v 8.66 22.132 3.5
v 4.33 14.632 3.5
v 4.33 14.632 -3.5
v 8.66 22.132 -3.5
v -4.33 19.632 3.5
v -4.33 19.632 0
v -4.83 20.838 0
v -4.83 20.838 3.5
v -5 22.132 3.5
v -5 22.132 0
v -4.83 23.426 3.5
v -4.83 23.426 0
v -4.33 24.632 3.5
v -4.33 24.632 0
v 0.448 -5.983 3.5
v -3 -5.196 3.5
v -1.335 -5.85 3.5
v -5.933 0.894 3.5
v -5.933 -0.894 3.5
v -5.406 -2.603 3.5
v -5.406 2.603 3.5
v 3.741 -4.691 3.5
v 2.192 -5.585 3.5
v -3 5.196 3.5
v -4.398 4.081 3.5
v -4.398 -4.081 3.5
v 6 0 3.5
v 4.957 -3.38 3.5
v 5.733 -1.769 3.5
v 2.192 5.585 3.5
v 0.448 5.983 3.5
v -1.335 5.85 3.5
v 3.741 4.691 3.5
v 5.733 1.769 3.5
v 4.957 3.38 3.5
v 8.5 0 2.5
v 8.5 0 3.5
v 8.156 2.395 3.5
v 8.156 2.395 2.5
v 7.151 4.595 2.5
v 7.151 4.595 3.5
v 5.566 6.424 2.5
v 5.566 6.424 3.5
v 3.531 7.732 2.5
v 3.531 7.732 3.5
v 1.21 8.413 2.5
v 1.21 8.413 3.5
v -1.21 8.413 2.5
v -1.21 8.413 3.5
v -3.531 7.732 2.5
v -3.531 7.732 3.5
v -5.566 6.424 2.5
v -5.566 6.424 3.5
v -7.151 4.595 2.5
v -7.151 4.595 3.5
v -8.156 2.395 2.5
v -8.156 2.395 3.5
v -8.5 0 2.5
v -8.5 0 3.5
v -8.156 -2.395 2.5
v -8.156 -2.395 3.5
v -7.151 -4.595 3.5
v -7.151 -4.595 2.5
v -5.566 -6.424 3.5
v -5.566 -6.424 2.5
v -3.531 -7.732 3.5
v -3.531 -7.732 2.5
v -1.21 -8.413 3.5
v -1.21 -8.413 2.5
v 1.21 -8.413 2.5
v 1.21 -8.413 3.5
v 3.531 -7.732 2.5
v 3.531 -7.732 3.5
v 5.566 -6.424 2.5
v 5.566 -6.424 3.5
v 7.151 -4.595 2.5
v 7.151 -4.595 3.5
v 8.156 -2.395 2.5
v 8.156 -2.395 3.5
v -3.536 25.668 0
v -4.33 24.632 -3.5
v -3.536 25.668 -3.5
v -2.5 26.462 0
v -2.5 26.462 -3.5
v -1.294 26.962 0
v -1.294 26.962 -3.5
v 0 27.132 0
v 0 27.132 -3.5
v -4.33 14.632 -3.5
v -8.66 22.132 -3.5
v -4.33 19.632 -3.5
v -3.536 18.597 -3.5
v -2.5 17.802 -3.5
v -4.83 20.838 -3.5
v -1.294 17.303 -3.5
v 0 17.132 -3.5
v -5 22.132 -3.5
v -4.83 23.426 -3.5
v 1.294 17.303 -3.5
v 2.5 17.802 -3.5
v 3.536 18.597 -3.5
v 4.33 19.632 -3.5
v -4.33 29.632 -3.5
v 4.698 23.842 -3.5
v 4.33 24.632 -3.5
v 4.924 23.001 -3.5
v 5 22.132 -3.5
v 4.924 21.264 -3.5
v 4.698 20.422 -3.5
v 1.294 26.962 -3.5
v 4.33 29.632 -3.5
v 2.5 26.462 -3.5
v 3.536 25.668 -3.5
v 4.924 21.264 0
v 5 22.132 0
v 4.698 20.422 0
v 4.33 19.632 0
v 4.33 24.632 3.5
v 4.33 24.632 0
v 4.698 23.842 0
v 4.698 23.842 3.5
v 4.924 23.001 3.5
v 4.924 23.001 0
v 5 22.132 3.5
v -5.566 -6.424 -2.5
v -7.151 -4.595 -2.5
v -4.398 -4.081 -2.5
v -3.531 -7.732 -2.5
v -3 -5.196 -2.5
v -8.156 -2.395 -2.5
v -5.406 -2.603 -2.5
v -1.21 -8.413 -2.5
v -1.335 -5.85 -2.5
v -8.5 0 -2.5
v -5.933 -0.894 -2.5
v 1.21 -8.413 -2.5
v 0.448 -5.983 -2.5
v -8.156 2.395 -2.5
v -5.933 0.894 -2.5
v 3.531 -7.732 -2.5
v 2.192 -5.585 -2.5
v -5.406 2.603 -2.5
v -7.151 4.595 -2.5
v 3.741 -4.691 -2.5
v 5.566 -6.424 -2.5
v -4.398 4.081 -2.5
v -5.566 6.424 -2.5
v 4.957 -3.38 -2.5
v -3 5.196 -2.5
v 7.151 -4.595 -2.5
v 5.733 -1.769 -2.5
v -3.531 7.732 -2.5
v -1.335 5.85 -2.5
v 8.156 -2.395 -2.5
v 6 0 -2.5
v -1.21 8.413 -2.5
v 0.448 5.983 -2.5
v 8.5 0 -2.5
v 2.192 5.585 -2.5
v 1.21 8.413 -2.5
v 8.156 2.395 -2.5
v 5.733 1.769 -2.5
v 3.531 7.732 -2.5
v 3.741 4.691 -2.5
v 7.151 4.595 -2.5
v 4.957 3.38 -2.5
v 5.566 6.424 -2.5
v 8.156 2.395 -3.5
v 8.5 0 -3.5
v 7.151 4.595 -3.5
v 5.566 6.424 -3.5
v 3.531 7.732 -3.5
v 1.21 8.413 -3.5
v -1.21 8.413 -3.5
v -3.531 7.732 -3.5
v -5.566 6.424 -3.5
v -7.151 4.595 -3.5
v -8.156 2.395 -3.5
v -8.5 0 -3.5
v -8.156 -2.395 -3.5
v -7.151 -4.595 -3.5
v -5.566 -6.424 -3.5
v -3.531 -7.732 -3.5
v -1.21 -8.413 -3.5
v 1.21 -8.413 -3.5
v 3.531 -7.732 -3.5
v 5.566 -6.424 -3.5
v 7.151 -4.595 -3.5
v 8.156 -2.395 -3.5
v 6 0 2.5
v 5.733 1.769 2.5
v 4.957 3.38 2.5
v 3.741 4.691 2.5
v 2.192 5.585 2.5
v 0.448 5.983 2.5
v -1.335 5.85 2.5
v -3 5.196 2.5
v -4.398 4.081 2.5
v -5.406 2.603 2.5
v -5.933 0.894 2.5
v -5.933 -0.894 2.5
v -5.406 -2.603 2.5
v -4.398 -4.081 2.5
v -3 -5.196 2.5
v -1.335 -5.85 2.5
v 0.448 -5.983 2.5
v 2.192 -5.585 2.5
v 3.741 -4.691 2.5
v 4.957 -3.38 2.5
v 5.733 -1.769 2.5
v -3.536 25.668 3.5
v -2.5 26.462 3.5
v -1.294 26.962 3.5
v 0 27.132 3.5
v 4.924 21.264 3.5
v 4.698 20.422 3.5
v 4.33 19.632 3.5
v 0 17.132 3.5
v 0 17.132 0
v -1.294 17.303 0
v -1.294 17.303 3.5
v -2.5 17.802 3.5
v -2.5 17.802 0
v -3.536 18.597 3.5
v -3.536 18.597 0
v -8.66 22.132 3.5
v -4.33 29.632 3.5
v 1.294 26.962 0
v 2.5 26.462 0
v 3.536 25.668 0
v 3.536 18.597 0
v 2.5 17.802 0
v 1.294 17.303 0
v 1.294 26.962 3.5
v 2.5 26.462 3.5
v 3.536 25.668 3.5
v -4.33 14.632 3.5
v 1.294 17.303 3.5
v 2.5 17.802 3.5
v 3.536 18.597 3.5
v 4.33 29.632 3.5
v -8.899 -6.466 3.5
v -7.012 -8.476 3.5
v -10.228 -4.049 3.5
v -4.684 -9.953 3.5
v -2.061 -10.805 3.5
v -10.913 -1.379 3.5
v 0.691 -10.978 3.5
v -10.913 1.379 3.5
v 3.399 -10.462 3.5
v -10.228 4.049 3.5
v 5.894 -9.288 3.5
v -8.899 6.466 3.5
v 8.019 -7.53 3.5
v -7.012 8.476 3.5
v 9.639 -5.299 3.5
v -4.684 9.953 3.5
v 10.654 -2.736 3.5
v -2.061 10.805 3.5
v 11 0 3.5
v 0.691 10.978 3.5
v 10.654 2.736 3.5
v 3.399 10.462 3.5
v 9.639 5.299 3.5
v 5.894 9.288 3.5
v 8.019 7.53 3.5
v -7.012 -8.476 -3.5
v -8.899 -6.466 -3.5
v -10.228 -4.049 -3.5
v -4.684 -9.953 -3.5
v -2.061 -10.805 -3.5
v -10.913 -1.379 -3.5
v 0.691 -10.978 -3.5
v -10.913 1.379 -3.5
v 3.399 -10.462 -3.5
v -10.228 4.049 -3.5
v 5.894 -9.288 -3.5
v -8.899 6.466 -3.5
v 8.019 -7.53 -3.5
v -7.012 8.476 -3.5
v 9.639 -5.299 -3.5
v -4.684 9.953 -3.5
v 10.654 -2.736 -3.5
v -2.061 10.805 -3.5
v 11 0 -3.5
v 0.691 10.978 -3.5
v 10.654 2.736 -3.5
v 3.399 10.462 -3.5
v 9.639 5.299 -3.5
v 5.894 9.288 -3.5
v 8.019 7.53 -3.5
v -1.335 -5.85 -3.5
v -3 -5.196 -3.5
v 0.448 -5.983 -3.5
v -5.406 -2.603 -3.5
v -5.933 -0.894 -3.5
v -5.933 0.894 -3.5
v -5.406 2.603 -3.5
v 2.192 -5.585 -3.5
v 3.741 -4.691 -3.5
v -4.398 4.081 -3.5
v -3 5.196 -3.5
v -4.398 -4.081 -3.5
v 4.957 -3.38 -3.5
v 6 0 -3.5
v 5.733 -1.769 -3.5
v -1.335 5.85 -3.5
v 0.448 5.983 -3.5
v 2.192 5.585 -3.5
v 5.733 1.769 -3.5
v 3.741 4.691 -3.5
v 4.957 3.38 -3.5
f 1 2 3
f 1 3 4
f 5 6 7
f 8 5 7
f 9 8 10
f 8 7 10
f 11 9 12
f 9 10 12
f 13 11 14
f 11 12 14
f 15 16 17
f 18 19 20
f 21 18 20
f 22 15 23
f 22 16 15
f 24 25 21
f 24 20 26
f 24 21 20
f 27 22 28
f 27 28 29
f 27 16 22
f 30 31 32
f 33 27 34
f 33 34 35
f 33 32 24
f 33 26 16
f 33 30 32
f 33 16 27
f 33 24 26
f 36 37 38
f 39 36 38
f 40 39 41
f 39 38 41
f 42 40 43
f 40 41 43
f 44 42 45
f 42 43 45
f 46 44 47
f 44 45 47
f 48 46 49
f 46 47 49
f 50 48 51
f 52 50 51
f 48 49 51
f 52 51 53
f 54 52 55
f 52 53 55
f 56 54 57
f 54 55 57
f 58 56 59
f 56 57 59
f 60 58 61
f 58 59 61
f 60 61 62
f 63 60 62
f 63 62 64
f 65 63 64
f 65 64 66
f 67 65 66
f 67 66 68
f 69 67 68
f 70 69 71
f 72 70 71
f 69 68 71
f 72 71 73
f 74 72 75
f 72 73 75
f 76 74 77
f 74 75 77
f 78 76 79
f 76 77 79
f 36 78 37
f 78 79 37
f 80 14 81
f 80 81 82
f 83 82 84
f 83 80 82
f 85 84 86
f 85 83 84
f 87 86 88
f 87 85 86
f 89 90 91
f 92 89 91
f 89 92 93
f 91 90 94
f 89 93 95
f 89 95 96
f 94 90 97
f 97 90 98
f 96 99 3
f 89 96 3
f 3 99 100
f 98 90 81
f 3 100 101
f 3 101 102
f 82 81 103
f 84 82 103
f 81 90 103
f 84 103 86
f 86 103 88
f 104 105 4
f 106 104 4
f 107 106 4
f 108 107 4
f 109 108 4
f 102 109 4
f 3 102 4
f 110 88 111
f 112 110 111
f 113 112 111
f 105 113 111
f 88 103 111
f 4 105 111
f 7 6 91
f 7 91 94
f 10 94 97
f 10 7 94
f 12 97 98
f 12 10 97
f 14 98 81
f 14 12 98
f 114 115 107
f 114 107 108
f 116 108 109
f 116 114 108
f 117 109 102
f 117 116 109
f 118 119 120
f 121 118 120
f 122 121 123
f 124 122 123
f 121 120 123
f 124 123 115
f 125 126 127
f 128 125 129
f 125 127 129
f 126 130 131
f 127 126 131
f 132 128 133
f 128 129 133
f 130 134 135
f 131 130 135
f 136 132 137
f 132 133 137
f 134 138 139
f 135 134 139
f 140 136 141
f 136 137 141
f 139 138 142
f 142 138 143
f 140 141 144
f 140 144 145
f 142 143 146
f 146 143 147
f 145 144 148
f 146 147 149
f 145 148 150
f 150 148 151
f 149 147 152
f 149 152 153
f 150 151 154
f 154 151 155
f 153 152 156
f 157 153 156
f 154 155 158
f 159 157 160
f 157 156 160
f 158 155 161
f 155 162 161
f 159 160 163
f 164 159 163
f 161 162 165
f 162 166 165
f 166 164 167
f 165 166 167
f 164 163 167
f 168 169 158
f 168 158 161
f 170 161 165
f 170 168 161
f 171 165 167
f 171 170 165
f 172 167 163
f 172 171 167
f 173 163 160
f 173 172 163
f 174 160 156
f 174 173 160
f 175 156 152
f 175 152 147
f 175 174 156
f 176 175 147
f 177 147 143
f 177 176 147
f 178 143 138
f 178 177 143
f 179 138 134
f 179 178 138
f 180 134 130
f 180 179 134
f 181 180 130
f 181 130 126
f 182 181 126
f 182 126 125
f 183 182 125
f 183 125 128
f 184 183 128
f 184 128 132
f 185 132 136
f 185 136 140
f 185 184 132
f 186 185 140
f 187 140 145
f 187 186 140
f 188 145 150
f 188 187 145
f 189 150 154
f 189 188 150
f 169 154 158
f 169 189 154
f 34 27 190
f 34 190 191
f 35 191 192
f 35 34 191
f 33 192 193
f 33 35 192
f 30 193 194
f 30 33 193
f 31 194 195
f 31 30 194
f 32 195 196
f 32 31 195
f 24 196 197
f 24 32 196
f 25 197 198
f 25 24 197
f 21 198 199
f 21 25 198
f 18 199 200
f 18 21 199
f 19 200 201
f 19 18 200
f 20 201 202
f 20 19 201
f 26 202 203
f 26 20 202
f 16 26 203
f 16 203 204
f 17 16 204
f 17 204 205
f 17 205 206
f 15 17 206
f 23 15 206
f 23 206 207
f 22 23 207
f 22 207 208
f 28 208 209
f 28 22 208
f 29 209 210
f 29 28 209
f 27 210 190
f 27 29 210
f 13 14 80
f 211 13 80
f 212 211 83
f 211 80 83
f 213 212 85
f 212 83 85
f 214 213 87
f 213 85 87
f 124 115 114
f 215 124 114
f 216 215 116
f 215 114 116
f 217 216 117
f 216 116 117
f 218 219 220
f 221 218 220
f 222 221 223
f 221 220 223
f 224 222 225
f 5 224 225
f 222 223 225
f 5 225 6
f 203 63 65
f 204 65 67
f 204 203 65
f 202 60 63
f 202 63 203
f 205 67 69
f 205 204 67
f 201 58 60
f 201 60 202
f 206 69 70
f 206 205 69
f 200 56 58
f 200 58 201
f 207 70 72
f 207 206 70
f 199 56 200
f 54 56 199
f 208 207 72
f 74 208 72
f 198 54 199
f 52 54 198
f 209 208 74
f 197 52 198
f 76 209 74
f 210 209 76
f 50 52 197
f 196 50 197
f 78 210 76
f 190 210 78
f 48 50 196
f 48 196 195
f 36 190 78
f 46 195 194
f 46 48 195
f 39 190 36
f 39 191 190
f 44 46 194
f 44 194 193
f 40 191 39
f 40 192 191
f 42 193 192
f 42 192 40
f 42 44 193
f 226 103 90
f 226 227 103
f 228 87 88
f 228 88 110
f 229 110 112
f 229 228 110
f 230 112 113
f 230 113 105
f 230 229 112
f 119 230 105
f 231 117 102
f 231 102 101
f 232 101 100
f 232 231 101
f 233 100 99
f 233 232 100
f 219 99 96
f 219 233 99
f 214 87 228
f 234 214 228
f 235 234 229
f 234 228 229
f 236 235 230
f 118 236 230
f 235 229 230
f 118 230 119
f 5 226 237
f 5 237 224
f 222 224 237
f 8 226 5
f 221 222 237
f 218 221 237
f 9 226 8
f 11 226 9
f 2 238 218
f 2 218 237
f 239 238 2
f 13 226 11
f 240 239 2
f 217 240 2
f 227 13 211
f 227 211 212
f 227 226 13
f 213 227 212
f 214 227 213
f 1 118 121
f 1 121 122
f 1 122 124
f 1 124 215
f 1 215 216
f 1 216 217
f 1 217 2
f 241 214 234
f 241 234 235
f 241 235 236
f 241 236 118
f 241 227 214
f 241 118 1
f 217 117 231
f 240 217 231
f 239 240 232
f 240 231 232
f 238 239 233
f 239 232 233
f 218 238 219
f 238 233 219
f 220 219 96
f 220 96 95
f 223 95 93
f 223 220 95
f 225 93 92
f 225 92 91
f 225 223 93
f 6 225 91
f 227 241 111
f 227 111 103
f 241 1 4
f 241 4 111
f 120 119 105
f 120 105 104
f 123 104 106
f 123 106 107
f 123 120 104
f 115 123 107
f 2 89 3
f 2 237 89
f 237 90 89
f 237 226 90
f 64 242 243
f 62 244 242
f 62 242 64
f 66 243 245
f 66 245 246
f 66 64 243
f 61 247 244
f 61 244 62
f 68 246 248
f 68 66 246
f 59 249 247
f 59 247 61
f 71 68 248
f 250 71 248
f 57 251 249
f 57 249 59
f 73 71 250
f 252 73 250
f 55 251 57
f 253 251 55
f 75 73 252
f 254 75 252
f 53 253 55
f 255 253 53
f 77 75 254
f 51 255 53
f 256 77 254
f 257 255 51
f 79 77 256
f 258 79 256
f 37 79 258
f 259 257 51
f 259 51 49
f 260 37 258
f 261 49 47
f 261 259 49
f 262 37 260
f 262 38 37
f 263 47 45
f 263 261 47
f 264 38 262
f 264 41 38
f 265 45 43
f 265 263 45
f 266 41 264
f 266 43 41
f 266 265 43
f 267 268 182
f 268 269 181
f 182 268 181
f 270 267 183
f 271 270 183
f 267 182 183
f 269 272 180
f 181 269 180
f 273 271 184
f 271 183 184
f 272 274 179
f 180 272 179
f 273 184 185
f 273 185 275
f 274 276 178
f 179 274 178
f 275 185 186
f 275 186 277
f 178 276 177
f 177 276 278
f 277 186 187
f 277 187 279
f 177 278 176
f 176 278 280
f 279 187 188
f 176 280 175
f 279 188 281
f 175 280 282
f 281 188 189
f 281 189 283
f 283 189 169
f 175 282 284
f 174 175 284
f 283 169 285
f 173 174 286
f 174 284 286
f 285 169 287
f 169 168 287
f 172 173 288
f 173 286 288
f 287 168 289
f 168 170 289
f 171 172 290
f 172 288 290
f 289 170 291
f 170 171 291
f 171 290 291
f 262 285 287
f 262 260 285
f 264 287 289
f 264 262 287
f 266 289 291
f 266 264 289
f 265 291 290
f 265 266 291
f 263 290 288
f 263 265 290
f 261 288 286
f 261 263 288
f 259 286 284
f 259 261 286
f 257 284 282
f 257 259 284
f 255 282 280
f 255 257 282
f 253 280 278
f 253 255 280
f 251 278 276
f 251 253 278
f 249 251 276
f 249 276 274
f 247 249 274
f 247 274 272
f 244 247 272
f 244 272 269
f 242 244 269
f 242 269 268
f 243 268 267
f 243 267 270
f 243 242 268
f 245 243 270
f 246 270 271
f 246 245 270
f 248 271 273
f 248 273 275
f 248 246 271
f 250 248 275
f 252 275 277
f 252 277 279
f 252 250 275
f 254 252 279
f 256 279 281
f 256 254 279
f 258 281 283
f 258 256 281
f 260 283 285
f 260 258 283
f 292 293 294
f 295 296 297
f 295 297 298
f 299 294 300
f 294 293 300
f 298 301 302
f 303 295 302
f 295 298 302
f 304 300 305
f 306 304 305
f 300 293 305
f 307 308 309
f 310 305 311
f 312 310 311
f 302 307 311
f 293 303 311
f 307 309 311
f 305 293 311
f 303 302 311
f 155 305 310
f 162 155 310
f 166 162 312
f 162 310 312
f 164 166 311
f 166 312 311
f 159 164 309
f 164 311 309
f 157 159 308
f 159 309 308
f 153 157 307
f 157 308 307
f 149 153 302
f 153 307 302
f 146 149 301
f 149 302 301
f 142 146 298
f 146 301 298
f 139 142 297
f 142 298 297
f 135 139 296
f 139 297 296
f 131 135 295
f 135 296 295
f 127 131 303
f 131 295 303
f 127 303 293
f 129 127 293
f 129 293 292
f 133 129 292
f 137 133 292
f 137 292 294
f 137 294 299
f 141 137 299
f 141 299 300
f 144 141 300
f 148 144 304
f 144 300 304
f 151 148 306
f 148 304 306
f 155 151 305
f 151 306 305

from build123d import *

# Parameters (mm, degrees)
F0_R          = 11
F1_DEPTH      = 3.5
F1_DEPTH_BACK = 3.5
F3_DEPTH      = 3.5
F3_DEPTH_BACK = 3.5
F4_R          = 8.5
F4_R_2        = 6
F5_DEPTH      = 1


with BuildPart() as f1:
    # F0 (on Top) → F1 (new body, two sides)
    with BuildSketch(Plane.XY) as f1_sk:
        Circle(F0_R)
    extrude(amount=F1_DEPTH)
    extrude(f1_sk.sketch, amount=-F1_DEPTH_BACK)

    # F4 (on face) → F5 (cut)
    with BuildSketch(Plane.XY.offset(3.5)):
        Circle(F4_R)
        Circle(F4_R_2, mode=Mode.SUBTRACT)
    extrude(amount=-F5_DEPTH, mode=Mode.SUBTRACT)

    # F6: F1 across plane


with BuildPart() as f3:
    # F2 (on Top) → F3 (new body, two sides)
    with BuildSketch(Plane.XY) as f3_sk:
        Polygon((-4.330127, 14.632354), (4.330127, 14.632354), (8.660254, 22.132354), (4.330127, 29.632354), (-4.330127, 29.632354), (-8.660254, 22.132354), align=None)
        Polygon((4.330127, 19.632354), (2.886751, 17.132354), (0, 17.132354), (-2.886751, 17.132354), (-4.330127, 19.632354), (-5.773503, 22.132354), (-4.330127, 24.632354), (-2.886751, 27.132354), (0, 27.132354), (2.886751, 27.132354), (4.330127, 24.632354), (5.773503, 22.132354), align=None, mode=Mode.SUBTRACT)
        with BuildLine():
            Line((-2.886751, 17.132354), (0, 17.132354))
            ThreePointArc((0, 17.132354), (-2.5, 17.802227), (-4.330127, 19.632354))
            Line((-4.330127, 19.632354), (-2.886751, 17.132354))
        make_face()
        with BuildLine():
            Line((-5.773503, 22.132354), (-4.330127, 19.632354))
            ThreePointArc((-4.330127, 19.632354), (-5, 22.132354), (-4.330127, 24.632354))
            Line((-4.330127, 24.632354), (-5.773503, 22.132354))
        make_face()
        with BuildLine():
            Line((-2.886751, 27.132354), (-4.330127, 24.632354))
            ThreePointArc((-4.330127, 24.632354), (-2.5, 26.462481), (0, 27.132354))
            Line((0, 27.132354), (-2.886751, 27.132354))
        make_face()
        with BuildLine():
            ThreePointArc((0, 27.132354), (2.5, 26.462481), (4.330127, 24.632354))
            Line((4.330127, 24.632354), (2.886751, 27.132354))
            Line((2.886751, 27.132354), (0, 27.132354))
        make_face()
        with BuildLine():
            ThreePointArc((5, 22.132354), (4.829629, 20.838258), (4.330127, 19.632354))
            Line((4.330127, 19.632354), (5.773503, 22.132354))
            Line((5.773503, 22.132354), (4.330127, 24.632354))
            ThreePointArc((4.330127, 24.632354), (4.829629, 23.426449), (5, 22.132354))
        make_face()
        with BuildLine():
            Line((0, 17.132354), (2.886751, 17.132354))
            Line((2.886751, 17.132354), (4.330127, 19.632354))
            ThreePointArc((4.330127, 19.632354), (2.5, 17.802227), (0, 17.132354))
        make_face()
    extrude(amount=F3_DEPTH)
    extrude(f3_sk.sketch, amount=-F3_DEPTH_BACK)


with BuildPart() as f1_1:
    add(f1.part)
    add(f1.part.mirror(Plane.XY), mode=Mode.INTERSECT)


solid = Compound([f3.part, f1_1.part])
